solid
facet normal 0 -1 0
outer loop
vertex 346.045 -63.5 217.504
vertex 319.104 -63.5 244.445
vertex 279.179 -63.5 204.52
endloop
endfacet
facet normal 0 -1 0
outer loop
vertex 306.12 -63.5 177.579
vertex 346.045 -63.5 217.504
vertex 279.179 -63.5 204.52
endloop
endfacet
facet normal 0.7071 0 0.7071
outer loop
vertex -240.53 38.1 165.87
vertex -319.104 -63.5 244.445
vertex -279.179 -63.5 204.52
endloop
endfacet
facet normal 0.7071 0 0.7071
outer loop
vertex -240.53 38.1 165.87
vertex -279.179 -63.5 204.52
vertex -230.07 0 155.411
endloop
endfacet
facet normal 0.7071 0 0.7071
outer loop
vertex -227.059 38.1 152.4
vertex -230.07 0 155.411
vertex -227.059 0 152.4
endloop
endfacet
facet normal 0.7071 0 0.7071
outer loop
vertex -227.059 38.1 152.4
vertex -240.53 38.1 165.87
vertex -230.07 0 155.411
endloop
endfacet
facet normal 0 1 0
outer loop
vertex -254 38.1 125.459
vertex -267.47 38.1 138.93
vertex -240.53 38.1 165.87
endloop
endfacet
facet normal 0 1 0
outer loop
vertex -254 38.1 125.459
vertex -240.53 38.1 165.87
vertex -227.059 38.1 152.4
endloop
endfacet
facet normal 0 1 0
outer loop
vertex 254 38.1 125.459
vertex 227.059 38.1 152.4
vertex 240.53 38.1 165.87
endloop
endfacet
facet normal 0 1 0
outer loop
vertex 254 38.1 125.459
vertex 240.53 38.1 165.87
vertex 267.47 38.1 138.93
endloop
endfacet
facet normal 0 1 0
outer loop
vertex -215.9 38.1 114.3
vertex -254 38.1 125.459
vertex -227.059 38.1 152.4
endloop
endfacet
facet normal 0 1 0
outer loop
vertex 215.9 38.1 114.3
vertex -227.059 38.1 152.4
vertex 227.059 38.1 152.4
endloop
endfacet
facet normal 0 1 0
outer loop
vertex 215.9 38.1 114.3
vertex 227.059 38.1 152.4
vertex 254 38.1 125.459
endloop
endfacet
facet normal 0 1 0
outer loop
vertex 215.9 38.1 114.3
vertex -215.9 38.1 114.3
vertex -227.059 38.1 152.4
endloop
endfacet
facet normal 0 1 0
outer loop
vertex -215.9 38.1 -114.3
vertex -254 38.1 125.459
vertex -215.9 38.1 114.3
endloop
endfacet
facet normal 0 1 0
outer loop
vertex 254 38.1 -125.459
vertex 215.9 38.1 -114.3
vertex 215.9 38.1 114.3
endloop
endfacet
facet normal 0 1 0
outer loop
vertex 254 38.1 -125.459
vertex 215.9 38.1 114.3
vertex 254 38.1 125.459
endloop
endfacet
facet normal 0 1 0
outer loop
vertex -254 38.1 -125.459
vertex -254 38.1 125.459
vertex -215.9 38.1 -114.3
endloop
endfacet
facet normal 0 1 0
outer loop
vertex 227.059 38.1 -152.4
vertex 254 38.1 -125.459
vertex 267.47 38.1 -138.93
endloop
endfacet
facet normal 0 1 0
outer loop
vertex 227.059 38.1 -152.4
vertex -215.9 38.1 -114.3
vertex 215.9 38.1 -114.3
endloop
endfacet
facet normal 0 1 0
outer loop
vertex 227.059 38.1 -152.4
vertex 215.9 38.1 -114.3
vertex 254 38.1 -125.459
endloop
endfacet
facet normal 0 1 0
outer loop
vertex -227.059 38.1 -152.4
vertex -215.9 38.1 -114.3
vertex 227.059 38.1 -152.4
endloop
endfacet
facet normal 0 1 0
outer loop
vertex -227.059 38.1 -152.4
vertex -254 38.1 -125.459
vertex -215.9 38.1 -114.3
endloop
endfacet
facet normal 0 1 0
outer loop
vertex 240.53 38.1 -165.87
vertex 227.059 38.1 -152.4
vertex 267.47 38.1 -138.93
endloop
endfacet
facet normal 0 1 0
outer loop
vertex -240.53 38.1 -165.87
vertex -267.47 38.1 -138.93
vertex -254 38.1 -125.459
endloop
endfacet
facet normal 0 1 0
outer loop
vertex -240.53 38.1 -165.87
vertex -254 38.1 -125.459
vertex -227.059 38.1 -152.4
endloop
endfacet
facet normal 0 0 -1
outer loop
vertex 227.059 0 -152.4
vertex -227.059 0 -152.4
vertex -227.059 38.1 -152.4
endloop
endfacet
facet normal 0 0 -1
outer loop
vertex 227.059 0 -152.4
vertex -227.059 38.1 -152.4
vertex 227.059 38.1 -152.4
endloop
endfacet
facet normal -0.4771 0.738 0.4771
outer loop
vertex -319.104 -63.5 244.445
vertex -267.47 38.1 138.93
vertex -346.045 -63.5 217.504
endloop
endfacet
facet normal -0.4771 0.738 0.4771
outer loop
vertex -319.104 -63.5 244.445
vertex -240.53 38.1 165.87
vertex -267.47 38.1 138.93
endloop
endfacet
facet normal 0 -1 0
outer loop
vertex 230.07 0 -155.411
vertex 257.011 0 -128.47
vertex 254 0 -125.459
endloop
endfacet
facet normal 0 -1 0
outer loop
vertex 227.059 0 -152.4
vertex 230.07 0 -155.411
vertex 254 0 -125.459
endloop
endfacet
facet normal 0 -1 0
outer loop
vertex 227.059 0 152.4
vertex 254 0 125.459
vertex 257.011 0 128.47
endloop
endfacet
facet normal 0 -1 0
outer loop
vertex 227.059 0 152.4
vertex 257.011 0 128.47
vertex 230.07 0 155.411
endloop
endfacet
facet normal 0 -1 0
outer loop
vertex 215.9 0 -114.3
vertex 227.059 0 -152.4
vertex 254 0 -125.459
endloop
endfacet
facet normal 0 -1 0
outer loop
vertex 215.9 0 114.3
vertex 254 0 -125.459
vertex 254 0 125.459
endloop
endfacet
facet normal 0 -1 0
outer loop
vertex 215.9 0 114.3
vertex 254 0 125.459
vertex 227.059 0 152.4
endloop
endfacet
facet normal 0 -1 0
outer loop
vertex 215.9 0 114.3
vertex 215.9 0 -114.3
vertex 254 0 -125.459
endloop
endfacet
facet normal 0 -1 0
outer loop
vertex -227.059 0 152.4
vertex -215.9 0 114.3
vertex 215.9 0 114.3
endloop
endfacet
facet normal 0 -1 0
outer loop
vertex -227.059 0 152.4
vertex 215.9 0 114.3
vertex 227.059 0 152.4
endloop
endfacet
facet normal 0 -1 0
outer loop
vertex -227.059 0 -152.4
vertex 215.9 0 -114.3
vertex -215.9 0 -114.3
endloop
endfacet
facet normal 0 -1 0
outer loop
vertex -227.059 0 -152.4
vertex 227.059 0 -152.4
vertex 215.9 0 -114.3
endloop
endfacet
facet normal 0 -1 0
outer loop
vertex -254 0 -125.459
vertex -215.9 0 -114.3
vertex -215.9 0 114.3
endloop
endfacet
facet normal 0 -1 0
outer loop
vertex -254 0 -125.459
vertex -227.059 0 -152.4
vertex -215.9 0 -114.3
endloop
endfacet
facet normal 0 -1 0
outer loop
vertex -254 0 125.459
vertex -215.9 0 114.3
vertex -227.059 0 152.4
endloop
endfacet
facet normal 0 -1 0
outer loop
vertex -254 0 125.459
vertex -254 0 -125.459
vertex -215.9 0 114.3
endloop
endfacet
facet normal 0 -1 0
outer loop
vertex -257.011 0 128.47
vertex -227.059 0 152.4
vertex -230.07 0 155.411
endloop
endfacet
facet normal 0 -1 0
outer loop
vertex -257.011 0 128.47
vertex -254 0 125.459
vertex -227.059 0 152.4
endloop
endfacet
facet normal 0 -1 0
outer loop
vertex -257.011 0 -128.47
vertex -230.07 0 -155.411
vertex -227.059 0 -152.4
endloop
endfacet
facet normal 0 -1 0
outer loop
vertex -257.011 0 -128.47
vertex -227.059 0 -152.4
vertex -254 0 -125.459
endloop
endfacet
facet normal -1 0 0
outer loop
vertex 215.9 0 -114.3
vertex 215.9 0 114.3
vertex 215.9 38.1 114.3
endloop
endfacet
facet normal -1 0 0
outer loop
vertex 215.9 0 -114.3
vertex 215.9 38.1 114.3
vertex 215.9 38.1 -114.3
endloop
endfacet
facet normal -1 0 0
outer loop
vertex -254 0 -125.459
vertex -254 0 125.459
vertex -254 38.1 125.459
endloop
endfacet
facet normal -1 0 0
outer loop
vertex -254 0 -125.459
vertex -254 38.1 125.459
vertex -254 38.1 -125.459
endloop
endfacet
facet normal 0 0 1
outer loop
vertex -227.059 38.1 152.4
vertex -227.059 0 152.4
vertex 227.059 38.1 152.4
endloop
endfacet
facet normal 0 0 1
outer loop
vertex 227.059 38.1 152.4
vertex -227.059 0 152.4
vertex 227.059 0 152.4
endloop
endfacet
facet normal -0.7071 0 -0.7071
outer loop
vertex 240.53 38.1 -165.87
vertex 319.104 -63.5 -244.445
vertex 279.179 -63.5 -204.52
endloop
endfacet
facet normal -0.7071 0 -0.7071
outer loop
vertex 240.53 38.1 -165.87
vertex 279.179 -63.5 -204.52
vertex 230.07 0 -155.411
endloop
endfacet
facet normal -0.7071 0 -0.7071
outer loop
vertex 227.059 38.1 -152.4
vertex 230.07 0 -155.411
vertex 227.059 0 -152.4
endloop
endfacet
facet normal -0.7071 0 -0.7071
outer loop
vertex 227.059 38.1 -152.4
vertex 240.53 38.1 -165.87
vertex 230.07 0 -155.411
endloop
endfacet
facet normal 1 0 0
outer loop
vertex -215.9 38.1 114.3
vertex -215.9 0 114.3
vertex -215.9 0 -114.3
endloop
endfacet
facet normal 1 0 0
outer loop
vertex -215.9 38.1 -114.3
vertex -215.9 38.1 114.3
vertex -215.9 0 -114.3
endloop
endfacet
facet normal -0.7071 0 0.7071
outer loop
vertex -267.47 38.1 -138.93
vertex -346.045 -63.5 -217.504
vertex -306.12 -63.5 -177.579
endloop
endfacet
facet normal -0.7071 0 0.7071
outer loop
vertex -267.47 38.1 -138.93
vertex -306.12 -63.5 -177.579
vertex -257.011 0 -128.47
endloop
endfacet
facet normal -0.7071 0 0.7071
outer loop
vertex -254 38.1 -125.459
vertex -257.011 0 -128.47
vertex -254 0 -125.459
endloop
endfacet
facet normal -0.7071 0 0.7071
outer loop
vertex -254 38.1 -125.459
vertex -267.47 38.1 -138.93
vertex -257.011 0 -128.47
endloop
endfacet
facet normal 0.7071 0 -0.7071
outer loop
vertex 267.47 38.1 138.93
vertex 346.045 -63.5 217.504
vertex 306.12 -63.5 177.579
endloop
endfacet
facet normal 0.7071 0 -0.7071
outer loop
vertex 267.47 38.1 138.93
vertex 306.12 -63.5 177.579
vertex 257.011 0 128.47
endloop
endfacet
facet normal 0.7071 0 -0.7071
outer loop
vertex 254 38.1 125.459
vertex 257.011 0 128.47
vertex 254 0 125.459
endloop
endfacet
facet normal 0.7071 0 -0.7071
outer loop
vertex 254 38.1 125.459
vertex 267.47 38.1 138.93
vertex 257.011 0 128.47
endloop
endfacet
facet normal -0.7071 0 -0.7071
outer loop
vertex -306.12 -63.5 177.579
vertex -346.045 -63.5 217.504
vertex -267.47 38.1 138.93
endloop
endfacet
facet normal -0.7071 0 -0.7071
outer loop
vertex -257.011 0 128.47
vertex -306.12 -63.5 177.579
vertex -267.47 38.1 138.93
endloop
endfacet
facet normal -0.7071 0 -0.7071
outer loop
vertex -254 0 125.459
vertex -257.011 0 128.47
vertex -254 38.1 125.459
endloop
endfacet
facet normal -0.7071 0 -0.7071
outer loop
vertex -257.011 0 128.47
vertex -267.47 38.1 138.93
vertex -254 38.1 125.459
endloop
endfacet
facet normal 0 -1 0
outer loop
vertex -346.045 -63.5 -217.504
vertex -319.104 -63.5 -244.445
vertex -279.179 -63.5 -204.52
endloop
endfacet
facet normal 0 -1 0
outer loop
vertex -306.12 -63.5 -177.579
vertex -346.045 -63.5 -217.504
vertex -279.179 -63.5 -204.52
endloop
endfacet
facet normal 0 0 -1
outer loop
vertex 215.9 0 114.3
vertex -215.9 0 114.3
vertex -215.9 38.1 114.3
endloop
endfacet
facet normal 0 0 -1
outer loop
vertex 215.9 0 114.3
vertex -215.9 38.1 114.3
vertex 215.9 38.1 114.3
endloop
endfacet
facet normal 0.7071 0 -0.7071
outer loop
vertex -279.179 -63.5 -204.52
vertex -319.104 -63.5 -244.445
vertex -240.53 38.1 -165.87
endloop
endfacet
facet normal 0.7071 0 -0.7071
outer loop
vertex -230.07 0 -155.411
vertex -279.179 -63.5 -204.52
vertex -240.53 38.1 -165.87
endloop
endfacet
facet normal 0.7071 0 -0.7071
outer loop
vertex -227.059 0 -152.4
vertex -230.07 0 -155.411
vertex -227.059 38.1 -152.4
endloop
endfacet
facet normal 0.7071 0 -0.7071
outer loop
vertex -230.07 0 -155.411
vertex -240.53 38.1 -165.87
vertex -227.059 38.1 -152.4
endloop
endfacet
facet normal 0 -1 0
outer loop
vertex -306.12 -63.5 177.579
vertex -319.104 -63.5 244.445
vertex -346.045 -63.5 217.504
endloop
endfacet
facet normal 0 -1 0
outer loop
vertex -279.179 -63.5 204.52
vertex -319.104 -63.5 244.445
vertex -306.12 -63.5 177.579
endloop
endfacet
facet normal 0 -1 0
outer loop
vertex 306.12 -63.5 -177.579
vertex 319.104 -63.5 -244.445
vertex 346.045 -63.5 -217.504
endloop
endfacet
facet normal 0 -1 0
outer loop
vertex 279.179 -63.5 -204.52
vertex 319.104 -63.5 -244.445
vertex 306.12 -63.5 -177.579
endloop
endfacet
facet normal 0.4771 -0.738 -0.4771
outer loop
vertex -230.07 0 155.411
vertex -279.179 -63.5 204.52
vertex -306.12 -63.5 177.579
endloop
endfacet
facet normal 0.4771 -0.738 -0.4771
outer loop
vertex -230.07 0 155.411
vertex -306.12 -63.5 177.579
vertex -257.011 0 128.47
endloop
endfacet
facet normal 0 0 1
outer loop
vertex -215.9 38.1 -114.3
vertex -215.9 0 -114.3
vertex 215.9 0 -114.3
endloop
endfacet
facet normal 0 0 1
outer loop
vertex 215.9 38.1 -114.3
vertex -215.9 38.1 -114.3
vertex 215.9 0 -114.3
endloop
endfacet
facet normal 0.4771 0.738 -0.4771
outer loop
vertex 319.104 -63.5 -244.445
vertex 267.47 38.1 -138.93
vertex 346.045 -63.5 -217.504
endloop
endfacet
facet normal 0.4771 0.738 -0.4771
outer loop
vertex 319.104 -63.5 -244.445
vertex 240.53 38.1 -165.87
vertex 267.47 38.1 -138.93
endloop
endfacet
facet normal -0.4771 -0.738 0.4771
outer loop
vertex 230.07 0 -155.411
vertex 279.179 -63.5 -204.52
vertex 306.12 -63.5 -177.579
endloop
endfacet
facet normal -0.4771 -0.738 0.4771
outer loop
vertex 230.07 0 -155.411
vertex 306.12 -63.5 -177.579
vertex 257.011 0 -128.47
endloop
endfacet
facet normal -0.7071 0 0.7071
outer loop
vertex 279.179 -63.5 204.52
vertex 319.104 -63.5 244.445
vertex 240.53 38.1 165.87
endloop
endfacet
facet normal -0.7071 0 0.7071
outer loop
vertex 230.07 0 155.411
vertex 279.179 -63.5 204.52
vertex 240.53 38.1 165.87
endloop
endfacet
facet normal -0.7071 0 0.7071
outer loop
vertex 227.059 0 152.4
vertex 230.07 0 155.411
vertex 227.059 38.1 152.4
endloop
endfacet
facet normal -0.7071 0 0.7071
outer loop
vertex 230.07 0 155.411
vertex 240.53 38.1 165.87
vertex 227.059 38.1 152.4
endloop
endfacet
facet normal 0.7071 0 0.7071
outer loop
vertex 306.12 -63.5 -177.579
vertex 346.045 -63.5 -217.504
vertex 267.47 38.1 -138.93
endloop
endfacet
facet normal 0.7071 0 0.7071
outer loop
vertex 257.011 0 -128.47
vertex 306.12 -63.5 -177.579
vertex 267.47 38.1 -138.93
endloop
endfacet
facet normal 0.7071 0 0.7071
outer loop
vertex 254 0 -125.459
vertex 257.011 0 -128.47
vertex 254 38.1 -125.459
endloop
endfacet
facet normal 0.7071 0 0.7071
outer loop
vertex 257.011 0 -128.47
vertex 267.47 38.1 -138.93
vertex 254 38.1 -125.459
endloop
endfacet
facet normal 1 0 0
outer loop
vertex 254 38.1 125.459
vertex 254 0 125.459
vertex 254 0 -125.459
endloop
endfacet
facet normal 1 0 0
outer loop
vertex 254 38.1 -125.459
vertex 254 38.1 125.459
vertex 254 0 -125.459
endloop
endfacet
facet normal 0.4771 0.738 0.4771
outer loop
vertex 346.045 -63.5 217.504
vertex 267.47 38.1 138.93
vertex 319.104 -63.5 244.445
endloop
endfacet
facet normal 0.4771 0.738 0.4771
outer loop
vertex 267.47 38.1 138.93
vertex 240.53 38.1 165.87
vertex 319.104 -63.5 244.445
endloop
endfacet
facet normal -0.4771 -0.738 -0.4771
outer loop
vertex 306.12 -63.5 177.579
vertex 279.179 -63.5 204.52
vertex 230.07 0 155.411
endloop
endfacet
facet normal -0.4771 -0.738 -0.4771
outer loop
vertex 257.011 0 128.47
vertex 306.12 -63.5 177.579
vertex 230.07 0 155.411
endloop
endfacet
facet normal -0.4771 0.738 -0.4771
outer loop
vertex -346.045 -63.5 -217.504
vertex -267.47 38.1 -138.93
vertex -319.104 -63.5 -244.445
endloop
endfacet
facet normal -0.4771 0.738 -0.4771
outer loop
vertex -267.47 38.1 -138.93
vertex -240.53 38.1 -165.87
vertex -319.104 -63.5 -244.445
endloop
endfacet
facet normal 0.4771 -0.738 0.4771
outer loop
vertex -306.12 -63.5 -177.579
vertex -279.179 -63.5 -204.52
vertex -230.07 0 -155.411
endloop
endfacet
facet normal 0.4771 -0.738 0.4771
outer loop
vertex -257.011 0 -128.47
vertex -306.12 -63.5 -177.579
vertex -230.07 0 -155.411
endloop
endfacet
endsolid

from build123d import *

# Parameters (mm, degrees)
SKETCH1_W            = 508
SKETCH1_H            = 304.8
SKETCH1_W_2          = 431.8
SKETCH1_H_2          = 228.6
BOSS_EXTRUDE1_DEPTH  = 38.1
BOSS_EXTRUDE3_DEPTH  = 19.05
MIRROR3_COPY_1_DEPTH = 19.05


with BuildPart() as part:
    # Sketch1 → Boss-Extrude1 (new body)
    with BuildSketch(Plane(origin=(0, 0, 0), x_dir=(1, 0, 0), z_dir=(0, 1, 0))):
        Rectangle(SKETCH1_W, SKETCH1_H)
        Rectangle(SKETCH1_W_2, SKETCH1_H_2, mode=Mode.SUBTRACT)
    extrude(amount=BOSS_EXTRUDE1_DEPTH)

    # Sketch3 → Boss-Extrude3 (add, symmetric)
    with BuildSketch(Plane(origin=(-50.8, 0, -50.8), x_dir=(0.7071067811865475, 0, -0.7071067811865477), z_dir=(0.7071067811865477, 0, 0.7071067811865475))):
        Polygon((-287.368195874, 38.1), (-398.488889778, -63.5), (-342.026330623, -63.5), (-272.575896933, 0), (-266.942696668, 0), (-266.942696668, 38.1), align=None)
    boss_extrude3 = extrude(amount=BOSS_EXTRUDE3_DEPTH, both=True)

    # Mirror2: Boss-Extrude3 across plane
    add(boss_extrude3.mirror(Plane(origin=(0, 0, 0), x_dir=(0, 0, 1), z_dir=(1, 0, 0))))

    # Mirror3: Boss-Extrude3 across plane
    add(boss_extrude3.mirror(Plane.XY))

    # Mirror3 copy 1 sketch → Mirror3 copy 1 (add, symmetric)
    with BuildSketch(Plane(origin=(50.8, 0, 50.8), x_dir=(-0.7071067811865475, 0, 0.7071067811865477), z_dir=(-0.7071067811865477, 0, -0.7071067811865475))):
        Polygon((-287.368195874, 38.1), (-398.488889778, -63.5), (-342.026330623, -63.5), (-272.575896933, 0), (-266.942696668, 0), (-266.942696668, 38.1), align=None)
    extrude(amount=MIRROR3_COPY_1_DEPTH, both=True)


solid = part.part
